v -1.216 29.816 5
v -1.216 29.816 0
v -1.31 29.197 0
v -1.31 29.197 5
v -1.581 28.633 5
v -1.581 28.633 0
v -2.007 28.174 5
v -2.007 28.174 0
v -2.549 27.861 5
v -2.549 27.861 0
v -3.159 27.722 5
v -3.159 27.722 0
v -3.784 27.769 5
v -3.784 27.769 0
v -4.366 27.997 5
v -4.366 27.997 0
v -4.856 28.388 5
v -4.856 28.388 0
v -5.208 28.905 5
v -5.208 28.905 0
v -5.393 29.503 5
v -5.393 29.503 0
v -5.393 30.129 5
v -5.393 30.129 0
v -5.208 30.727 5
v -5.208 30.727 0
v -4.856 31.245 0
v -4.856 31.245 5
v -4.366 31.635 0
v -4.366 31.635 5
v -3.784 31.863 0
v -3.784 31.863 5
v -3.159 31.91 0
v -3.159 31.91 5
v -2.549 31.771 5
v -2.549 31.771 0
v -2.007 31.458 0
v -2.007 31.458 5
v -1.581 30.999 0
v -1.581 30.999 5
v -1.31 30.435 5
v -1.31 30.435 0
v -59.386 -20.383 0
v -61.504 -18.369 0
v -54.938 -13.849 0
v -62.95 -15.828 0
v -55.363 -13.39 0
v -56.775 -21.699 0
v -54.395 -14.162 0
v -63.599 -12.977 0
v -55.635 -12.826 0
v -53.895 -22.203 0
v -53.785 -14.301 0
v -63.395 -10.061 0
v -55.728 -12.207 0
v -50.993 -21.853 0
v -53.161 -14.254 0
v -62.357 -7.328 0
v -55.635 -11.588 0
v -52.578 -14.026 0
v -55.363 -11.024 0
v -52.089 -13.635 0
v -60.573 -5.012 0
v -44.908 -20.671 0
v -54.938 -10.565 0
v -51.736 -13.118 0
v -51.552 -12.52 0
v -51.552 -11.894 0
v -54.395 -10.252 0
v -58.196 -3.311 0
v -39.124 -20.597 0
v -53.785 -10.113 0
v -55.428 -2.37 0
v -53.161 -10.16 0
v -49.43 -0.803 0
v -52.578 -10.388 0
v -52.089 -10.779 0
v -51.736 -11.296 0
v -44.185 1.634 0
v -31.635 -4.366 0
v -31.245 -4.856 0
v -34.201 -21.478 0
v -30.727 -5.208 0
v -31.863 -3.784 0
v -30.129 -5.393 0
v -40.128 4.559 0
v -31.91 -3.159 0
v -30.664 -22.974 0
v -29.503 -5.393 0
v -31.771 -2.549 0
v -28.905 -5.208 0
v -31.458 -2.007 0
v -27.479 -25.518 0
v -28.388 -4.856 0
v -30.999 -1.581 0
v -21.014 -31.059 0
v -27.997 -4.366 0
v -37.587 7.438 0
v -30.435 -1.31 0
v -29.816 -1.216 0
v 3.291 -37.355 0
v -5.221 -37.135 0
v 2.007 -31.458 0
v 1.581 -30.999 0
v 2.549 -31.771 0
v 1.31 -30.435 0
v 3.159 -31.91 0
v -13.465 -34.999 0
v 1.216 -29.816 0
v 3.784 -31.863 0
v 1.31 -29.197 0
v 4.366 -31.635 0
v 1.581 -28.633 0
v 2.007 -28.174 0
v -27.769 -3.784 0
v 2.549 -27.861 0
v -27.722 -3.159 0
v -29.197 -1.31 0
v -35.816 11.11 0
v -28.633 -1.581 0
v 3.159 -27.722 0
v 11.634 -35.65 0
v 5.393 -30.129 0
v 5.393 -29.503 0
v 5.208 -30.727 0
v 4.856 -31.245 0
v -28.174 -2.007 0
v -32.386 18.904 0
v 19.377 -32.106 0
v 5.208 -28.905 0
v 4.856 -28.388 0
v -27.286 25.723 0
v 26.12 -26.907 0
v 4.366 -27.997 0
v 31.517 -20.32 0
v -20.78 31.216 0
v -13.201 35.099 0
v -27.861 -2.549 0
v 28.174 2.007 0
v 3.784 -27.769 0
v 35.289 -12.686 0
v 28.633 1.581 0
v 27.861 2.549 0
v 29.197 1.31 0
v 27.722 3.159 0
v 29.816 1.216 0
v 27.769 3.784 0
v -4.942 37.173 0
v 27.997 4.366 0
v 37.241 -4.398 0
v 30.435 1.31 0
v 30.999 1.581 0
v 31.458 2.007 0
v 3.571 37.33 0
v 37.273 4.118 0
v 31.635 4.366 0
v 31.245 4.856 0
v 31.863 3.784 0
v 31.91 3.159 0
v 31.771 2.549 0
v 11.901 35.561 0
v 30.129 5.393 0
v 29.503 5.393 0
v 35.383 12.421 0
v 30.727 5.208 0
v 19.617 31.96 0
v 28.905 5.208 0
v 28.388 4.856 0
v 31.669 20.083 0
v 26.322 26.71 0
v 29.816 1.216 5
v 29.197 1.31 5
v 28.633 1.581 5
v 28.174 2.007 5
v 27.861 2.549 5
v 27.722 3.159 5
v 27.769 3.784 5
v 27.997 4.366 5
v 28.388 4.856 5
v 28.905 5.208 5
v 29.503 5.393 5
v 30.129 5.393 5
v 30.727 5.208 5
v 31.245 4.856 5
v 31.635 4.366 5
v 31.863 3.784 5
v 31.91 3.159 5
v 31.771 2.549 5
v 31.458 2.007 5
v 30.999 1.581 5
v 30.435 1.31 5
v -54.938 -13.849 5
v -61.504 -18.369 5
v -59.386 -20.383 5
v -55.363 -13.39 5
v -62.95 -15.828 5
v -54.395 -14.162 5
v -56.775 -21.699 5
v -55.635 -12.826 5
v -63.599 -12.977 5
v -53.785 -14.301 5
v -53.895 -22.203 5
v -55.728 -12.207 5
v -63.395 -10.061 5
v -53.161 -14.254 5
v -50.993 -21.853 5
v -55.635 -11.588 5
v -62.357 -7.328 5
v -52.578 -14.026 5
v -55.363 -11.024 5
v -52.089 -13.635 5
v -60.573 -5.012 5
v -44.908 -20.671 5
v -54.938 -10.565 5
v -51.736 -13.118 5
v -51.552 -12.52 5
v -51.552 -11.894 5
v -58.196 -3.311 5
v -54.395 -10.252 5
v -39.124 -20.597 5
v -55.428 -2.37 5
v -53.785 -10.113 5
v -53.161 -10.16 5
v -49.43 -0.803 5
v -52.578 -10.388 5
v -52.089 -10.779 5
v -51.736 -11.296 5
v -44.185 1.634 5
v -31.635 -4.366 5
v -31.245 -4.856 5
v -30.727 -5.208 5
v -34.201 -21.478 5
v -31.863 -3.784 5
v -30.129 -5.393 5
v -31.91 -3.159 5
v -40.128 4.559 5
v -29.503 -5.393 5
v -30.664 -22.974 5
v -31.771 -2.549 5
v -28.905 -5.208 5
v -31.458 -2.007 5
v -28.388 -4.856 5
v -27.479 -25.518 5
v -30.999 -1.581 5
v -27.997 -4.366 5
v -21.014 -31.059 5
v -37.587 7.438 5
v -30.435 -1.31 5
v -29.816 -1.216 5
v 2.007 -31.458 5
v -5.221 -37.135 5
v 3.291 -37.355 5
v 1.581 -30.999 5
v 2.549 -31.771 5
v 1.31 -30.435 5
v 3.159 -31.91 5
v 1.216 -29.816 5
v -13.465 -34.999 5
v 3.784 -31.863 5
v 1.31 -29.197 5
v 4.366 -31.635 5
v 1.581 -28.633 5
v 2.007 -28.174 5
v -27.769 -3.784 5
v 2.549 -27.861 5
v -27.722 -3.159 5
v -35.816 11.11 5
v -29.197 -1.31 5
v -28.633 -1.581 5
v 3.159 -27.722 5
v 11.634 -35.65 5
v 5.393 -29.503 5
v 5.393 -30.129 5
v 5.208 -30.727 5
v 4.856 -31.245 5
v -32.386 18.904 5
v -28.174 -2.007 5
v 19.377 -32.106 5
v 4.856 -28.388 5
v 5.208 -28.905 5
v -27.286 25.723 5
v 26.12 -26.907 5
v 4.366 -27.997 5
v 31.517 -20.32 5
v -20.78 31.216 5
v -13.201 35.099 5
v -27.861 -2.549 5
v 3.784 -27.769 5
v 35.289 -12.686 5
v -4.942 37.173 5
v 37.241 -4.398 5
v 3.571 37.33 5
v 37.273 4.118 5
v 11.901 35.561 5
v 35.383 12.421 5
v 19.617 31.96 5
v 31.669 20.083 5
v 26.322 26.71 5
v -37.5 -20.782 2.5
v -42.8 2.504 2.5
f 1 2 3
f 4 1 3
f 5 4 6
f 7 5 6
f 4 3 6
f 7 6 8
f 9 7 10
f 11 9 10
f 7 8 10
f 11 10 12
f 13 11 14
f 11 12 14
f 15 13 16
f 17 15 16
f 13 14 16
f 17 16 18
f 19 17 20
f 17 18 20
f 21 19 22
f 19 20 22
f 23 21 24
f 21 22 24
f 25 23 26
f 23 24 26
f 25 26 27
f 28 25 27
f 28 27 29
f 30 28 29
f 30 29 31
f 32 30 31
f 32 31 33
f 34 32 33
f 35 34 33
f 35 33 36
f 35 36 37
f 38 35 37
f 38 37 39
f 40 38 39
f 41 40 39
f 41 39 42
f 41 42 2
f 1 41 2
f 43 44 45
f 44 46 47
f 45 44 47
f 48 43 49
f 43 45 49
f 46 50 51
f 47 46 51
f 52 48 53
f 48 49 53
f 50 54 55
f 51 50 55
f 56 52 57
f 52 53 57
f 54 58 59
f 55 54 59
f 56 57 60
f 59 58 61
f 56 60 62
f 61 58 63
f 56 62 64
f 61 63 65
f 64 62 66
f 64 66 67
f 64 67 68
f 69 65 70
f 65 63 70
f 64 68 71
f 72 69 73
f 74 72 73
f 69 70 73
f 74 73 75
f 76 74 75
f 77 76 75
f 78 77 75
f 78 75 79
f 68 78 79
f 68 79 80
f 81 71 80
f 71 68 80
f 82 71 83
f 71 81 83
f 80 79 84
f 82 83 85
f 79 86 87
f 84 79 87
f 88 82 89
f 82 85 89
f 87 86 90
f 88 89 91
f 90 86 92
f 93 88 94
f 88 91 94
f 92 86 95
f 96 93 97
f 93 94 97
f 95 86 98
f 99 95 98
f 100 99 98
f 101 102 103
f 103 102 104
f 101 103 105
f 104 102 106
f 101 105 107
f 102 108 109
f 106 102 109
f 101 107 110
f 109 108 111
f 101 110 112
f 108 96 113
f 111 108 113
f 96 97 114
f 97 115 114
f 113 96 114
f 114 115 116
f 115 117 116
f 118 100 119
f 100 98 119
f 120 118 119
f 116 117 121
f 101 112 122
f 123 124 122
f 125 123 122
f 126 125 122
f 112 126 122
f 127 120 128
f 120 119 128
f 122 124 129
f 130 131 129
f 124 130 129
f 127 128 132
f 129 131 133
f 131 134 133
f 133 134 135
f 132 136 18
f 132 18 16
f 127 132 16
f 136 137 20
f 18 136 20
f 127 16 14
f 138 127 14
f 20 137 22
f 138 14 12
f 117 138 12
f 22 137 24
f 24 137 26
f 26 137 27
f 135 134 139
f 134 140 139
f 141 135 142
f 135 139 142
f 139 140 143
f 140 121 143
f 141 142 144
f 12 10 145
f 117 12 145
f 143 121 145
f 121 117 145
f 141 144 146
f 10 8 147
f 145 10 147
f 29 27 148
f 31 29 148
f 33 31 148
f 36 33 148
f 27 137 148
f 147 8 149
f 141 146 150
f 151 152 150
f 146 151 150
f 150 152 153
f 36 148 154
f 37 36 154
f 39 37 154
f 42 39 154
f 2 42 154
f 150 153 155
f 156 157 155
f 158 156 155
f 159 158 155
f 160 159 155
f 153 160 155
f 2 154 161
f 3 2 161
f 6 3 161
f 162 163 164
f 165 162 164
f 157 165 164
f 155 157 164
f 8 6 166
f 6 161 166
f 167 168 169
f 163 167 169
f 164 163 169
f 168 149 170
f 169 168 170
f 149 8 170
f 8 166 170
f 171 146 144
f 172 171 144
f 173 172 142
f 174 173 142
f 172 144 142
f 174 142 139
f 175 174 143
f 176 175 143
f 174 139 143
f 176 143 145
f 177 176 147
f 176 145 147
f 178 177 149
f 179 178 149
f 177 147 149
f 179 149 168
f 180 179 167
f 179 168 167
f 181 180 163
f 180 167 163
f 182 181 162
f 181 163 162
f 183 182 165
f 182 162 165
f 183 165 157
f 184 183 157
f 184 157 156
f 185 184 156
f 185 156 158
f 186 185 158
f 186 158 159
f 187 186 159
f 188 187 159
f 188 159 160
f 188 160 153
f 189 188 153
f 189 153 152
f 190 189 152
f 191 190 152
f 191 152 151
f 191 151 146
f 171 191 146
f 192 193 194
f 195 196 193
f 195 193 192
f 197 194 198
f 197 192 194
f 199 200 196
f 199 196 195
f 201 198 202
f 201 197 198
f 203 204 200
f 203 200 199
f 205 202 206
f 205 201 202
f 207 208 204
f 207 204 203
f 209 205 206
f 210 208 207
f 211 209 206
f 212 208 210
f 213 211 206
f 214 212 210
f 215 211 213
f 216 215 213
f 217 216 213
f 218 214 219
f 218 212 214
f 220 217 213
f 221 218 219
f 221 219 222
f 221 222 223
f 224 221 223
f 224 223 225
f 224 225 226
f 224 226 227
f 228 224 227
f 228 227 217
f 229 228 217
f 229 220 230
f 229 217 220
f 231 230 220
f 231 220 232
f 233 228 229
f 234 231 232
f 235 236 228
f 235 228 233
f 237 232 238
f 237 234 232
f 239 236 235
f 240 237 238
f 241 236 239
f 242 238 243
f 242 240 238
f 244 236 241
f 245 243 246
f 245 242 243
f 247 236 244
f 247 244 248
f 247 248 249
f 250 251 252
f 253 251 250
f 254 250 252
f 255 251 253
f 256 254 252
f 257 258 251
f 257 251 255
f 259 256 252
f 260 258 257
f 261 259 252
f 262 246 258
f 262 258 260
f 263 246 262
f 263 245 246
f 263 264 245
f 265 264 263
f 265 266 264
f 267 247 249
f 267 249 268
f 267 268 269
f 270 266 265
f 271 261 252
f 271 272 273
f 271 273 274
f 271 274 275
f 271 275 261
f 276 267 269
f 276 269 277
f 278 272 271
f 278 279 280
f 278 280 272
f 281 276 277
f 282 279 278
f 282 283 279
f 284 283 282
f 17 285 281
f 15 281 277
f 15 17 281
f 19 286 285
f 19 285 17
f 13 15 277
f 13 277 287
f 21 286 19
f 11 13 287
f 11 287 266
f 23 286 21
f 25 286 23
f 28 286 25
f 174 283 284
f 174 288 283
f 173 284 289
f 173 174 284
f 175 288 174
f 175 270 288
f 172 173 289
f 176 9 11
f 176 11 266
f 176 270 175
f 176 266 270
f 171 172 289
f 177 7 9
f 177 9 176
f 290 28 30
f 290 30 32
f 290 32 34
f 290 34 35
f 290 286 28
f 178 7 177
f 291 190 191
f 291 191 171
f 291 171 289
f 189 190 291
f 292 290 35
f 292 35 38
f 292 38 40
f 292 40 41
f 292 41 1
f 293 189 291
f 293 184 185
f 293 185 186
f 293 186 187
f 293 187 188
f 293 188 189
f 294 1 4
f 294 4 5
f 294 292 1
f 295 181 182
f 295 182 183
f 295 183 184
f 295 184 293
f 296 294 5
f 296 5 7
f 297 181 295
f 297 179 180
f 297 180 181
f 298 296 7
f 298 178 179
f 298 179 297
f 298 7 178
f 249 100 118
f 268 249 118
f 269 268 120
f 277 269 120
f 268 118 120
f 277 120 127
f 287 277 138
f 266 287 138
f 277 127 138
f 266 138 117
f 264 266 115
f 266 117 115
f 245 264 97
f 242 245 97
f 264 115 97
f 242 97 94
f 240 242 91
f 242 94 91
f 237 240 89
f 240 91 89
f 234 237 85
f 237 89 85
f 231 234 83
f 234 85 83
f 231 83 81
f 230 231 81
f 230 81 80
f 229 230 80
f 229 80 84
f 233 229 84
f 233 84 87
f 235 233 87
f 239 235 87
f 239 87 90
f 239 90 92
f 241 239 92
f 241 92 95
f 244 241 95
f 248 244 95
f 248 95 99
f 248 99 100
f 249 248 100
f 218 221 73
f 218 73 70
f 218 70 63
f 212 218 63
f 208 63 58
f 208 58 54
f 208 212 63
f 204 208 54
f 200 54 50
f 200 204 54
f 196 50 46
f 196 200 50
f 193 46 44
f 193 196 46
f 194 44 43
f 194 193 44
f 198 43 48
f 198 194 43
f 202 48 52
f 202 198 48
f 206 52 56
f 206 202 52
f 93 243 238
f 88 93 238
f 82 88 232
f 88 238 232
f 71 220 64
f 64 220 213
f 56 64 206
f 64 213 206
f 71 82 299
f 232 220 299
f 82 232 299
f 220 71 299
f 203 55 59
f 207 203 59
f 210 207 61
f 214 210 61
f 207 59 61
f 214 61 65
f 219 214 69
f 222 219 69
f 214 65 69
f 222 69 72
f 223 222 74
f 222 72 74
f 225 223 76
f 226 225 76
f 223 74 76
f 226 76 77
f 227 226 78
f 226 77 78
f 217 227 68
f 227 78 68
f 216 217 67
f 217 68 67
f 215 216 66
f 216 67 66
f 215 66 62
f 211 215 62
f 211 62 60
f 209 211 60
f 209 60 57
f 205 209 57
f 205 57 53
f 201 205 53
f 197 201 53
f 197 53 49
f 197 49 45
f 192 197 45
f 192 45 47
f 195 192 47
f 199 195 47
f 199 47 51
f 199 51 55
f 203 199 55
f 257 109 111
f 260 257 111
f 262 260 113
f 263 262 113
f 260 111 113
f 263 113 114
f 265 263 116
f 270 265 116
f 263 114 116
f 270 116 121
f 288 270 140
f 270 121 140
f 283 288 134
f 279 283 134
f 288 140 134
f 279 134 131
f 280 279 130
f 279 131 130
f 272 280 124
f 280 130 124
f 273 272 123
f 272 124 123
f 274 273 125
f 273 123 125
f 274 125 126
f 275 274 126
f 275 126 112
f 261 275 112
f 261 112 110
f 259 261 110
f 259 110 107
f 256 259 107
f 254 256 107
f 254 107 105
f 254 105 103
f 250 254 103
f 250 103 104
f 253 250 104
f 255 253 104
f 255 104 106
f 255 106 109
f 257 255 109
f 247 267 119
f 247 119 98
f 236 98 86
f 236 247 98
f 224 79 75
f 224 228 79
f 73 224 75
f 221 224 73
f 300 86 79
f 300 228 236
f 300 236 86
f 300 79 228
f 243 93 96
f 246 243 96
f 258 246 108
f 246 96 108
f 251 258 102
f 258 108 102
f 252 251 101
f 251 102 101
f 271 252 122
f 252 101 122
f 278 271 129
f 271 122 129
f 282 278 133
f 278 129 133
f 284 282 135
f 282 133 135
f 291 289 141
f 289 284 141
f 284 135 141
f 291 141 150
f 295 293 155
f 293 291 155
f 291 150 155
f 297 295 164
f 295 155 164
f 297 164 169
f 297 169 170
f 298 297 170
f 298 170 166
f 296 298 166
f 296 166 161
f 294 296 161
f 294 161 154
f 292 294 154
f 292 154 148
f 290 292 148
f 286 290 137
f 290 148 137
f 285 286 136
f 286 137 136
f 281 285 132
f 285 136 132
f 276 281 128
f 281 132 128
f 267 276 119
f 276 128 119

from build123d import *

# Parameters (mm, degrees)
ESQUISSE1_R                               = 37.5
BOSS_EXTRU_1_DEPTH                        = 5
TROU_POUR_TARAUDAGE_POUR_TROU_TARAUD_M5_D = 4.2
R_P_TITION_CIRCULAIRE1_COUNT              = 4
BOSS_EXTRU_2_DEPTH                        = 5
TROU_POUR_TARAUDAGE_POUR_TROU_TARAUD_2_D  = 4.2


with BuildPart() as part:
    # Esquisse1 → Boss.-Extru.1 (new body)
    with BuildSketch(Plane.XY):
        Circle(ESQUISSE1_R)
    extrude(amount=BOSS_EXTRU_1_DEPTH)

    # Trou pour taraudage pour trou taraud_ M5 (through all)
    with Locations(Plane.XY.offset(5)):
        with Locations((3.3162691, -29.816142595)):
            trou_pour_taraudage_pour_trou_taraud_m5 = Hole(TROU_POUR_TARAUDAGE_POUR_TROU_TARAUD_M5_D / 2)

    # Répétition circulaire1: Trou pour taraudage pour trou taraud_ M5 ×4 about axis
    r_p_tition_circulaire1_axis = Axis((0, 0, 0), (0, 0, 1))
    for i in range(1, R_P_TITION_CIRCULAIRE1_COUNT):
        add(trou_pour_taraudage_pour_trou_taraud_m5.rotate(r_p_tition_circulaire1_axis, i * 360 / R_P_TITION_CIRCULAIRE1_COUNT), mode=Mode.SUBTRACT)

    # Esquisse4 → Boss.-Extru.2 (add)
    with BuildSketch(Plane.XY.offset(5)):
        with BuildLine():
            ThreePointArc((-55.427721141, -2.370238342), (-63.3788401, -14.426455821), (-50.992891265, -21.853497228))
            add(Edge.make_bspline(
                [(-27.47890369, -25.517833999), (-30.318179528, -22.460357126), (-38.333660049, -19.857417418), (-46.174070418, -20.537027691), (-50.992891265, -21.853497228)],
                knots=[0, 0, 0, 0, 0.450210397, 1, 1, 1, 1], degree=3))
            ThreePointArc((-27.47890369, -25.517833999), (-36.564715442, -8.322955281), (-35.816319782, 11.110411212))
            add(Edge.make_bspline(
                [(-35.816319782, 11.110411212), (-37.052534505, 7.125260617), (-43.151729094, 1.309501984), (-50.513854322, -1.471328291), (-55.427721141, -2.370238342)],
                knots=[0, 0, 0, 0, 0.450210397, 1, 1, 1, 1], degree=3))
        make_face()
    extrude(amount=-BOSS_EXTRU_2_DEPTH)

    # Trou pour taraudage pour trou taraud 2 (through all)
    with Locations(Plane.XY.offset(5)):
        with Locations((-53.628249316, -12.207001079)):
            Hole(TROU_POUR_TARAUDAGE_POUR_TROU_TARAUD_2_D / 2)


solid = part.part
